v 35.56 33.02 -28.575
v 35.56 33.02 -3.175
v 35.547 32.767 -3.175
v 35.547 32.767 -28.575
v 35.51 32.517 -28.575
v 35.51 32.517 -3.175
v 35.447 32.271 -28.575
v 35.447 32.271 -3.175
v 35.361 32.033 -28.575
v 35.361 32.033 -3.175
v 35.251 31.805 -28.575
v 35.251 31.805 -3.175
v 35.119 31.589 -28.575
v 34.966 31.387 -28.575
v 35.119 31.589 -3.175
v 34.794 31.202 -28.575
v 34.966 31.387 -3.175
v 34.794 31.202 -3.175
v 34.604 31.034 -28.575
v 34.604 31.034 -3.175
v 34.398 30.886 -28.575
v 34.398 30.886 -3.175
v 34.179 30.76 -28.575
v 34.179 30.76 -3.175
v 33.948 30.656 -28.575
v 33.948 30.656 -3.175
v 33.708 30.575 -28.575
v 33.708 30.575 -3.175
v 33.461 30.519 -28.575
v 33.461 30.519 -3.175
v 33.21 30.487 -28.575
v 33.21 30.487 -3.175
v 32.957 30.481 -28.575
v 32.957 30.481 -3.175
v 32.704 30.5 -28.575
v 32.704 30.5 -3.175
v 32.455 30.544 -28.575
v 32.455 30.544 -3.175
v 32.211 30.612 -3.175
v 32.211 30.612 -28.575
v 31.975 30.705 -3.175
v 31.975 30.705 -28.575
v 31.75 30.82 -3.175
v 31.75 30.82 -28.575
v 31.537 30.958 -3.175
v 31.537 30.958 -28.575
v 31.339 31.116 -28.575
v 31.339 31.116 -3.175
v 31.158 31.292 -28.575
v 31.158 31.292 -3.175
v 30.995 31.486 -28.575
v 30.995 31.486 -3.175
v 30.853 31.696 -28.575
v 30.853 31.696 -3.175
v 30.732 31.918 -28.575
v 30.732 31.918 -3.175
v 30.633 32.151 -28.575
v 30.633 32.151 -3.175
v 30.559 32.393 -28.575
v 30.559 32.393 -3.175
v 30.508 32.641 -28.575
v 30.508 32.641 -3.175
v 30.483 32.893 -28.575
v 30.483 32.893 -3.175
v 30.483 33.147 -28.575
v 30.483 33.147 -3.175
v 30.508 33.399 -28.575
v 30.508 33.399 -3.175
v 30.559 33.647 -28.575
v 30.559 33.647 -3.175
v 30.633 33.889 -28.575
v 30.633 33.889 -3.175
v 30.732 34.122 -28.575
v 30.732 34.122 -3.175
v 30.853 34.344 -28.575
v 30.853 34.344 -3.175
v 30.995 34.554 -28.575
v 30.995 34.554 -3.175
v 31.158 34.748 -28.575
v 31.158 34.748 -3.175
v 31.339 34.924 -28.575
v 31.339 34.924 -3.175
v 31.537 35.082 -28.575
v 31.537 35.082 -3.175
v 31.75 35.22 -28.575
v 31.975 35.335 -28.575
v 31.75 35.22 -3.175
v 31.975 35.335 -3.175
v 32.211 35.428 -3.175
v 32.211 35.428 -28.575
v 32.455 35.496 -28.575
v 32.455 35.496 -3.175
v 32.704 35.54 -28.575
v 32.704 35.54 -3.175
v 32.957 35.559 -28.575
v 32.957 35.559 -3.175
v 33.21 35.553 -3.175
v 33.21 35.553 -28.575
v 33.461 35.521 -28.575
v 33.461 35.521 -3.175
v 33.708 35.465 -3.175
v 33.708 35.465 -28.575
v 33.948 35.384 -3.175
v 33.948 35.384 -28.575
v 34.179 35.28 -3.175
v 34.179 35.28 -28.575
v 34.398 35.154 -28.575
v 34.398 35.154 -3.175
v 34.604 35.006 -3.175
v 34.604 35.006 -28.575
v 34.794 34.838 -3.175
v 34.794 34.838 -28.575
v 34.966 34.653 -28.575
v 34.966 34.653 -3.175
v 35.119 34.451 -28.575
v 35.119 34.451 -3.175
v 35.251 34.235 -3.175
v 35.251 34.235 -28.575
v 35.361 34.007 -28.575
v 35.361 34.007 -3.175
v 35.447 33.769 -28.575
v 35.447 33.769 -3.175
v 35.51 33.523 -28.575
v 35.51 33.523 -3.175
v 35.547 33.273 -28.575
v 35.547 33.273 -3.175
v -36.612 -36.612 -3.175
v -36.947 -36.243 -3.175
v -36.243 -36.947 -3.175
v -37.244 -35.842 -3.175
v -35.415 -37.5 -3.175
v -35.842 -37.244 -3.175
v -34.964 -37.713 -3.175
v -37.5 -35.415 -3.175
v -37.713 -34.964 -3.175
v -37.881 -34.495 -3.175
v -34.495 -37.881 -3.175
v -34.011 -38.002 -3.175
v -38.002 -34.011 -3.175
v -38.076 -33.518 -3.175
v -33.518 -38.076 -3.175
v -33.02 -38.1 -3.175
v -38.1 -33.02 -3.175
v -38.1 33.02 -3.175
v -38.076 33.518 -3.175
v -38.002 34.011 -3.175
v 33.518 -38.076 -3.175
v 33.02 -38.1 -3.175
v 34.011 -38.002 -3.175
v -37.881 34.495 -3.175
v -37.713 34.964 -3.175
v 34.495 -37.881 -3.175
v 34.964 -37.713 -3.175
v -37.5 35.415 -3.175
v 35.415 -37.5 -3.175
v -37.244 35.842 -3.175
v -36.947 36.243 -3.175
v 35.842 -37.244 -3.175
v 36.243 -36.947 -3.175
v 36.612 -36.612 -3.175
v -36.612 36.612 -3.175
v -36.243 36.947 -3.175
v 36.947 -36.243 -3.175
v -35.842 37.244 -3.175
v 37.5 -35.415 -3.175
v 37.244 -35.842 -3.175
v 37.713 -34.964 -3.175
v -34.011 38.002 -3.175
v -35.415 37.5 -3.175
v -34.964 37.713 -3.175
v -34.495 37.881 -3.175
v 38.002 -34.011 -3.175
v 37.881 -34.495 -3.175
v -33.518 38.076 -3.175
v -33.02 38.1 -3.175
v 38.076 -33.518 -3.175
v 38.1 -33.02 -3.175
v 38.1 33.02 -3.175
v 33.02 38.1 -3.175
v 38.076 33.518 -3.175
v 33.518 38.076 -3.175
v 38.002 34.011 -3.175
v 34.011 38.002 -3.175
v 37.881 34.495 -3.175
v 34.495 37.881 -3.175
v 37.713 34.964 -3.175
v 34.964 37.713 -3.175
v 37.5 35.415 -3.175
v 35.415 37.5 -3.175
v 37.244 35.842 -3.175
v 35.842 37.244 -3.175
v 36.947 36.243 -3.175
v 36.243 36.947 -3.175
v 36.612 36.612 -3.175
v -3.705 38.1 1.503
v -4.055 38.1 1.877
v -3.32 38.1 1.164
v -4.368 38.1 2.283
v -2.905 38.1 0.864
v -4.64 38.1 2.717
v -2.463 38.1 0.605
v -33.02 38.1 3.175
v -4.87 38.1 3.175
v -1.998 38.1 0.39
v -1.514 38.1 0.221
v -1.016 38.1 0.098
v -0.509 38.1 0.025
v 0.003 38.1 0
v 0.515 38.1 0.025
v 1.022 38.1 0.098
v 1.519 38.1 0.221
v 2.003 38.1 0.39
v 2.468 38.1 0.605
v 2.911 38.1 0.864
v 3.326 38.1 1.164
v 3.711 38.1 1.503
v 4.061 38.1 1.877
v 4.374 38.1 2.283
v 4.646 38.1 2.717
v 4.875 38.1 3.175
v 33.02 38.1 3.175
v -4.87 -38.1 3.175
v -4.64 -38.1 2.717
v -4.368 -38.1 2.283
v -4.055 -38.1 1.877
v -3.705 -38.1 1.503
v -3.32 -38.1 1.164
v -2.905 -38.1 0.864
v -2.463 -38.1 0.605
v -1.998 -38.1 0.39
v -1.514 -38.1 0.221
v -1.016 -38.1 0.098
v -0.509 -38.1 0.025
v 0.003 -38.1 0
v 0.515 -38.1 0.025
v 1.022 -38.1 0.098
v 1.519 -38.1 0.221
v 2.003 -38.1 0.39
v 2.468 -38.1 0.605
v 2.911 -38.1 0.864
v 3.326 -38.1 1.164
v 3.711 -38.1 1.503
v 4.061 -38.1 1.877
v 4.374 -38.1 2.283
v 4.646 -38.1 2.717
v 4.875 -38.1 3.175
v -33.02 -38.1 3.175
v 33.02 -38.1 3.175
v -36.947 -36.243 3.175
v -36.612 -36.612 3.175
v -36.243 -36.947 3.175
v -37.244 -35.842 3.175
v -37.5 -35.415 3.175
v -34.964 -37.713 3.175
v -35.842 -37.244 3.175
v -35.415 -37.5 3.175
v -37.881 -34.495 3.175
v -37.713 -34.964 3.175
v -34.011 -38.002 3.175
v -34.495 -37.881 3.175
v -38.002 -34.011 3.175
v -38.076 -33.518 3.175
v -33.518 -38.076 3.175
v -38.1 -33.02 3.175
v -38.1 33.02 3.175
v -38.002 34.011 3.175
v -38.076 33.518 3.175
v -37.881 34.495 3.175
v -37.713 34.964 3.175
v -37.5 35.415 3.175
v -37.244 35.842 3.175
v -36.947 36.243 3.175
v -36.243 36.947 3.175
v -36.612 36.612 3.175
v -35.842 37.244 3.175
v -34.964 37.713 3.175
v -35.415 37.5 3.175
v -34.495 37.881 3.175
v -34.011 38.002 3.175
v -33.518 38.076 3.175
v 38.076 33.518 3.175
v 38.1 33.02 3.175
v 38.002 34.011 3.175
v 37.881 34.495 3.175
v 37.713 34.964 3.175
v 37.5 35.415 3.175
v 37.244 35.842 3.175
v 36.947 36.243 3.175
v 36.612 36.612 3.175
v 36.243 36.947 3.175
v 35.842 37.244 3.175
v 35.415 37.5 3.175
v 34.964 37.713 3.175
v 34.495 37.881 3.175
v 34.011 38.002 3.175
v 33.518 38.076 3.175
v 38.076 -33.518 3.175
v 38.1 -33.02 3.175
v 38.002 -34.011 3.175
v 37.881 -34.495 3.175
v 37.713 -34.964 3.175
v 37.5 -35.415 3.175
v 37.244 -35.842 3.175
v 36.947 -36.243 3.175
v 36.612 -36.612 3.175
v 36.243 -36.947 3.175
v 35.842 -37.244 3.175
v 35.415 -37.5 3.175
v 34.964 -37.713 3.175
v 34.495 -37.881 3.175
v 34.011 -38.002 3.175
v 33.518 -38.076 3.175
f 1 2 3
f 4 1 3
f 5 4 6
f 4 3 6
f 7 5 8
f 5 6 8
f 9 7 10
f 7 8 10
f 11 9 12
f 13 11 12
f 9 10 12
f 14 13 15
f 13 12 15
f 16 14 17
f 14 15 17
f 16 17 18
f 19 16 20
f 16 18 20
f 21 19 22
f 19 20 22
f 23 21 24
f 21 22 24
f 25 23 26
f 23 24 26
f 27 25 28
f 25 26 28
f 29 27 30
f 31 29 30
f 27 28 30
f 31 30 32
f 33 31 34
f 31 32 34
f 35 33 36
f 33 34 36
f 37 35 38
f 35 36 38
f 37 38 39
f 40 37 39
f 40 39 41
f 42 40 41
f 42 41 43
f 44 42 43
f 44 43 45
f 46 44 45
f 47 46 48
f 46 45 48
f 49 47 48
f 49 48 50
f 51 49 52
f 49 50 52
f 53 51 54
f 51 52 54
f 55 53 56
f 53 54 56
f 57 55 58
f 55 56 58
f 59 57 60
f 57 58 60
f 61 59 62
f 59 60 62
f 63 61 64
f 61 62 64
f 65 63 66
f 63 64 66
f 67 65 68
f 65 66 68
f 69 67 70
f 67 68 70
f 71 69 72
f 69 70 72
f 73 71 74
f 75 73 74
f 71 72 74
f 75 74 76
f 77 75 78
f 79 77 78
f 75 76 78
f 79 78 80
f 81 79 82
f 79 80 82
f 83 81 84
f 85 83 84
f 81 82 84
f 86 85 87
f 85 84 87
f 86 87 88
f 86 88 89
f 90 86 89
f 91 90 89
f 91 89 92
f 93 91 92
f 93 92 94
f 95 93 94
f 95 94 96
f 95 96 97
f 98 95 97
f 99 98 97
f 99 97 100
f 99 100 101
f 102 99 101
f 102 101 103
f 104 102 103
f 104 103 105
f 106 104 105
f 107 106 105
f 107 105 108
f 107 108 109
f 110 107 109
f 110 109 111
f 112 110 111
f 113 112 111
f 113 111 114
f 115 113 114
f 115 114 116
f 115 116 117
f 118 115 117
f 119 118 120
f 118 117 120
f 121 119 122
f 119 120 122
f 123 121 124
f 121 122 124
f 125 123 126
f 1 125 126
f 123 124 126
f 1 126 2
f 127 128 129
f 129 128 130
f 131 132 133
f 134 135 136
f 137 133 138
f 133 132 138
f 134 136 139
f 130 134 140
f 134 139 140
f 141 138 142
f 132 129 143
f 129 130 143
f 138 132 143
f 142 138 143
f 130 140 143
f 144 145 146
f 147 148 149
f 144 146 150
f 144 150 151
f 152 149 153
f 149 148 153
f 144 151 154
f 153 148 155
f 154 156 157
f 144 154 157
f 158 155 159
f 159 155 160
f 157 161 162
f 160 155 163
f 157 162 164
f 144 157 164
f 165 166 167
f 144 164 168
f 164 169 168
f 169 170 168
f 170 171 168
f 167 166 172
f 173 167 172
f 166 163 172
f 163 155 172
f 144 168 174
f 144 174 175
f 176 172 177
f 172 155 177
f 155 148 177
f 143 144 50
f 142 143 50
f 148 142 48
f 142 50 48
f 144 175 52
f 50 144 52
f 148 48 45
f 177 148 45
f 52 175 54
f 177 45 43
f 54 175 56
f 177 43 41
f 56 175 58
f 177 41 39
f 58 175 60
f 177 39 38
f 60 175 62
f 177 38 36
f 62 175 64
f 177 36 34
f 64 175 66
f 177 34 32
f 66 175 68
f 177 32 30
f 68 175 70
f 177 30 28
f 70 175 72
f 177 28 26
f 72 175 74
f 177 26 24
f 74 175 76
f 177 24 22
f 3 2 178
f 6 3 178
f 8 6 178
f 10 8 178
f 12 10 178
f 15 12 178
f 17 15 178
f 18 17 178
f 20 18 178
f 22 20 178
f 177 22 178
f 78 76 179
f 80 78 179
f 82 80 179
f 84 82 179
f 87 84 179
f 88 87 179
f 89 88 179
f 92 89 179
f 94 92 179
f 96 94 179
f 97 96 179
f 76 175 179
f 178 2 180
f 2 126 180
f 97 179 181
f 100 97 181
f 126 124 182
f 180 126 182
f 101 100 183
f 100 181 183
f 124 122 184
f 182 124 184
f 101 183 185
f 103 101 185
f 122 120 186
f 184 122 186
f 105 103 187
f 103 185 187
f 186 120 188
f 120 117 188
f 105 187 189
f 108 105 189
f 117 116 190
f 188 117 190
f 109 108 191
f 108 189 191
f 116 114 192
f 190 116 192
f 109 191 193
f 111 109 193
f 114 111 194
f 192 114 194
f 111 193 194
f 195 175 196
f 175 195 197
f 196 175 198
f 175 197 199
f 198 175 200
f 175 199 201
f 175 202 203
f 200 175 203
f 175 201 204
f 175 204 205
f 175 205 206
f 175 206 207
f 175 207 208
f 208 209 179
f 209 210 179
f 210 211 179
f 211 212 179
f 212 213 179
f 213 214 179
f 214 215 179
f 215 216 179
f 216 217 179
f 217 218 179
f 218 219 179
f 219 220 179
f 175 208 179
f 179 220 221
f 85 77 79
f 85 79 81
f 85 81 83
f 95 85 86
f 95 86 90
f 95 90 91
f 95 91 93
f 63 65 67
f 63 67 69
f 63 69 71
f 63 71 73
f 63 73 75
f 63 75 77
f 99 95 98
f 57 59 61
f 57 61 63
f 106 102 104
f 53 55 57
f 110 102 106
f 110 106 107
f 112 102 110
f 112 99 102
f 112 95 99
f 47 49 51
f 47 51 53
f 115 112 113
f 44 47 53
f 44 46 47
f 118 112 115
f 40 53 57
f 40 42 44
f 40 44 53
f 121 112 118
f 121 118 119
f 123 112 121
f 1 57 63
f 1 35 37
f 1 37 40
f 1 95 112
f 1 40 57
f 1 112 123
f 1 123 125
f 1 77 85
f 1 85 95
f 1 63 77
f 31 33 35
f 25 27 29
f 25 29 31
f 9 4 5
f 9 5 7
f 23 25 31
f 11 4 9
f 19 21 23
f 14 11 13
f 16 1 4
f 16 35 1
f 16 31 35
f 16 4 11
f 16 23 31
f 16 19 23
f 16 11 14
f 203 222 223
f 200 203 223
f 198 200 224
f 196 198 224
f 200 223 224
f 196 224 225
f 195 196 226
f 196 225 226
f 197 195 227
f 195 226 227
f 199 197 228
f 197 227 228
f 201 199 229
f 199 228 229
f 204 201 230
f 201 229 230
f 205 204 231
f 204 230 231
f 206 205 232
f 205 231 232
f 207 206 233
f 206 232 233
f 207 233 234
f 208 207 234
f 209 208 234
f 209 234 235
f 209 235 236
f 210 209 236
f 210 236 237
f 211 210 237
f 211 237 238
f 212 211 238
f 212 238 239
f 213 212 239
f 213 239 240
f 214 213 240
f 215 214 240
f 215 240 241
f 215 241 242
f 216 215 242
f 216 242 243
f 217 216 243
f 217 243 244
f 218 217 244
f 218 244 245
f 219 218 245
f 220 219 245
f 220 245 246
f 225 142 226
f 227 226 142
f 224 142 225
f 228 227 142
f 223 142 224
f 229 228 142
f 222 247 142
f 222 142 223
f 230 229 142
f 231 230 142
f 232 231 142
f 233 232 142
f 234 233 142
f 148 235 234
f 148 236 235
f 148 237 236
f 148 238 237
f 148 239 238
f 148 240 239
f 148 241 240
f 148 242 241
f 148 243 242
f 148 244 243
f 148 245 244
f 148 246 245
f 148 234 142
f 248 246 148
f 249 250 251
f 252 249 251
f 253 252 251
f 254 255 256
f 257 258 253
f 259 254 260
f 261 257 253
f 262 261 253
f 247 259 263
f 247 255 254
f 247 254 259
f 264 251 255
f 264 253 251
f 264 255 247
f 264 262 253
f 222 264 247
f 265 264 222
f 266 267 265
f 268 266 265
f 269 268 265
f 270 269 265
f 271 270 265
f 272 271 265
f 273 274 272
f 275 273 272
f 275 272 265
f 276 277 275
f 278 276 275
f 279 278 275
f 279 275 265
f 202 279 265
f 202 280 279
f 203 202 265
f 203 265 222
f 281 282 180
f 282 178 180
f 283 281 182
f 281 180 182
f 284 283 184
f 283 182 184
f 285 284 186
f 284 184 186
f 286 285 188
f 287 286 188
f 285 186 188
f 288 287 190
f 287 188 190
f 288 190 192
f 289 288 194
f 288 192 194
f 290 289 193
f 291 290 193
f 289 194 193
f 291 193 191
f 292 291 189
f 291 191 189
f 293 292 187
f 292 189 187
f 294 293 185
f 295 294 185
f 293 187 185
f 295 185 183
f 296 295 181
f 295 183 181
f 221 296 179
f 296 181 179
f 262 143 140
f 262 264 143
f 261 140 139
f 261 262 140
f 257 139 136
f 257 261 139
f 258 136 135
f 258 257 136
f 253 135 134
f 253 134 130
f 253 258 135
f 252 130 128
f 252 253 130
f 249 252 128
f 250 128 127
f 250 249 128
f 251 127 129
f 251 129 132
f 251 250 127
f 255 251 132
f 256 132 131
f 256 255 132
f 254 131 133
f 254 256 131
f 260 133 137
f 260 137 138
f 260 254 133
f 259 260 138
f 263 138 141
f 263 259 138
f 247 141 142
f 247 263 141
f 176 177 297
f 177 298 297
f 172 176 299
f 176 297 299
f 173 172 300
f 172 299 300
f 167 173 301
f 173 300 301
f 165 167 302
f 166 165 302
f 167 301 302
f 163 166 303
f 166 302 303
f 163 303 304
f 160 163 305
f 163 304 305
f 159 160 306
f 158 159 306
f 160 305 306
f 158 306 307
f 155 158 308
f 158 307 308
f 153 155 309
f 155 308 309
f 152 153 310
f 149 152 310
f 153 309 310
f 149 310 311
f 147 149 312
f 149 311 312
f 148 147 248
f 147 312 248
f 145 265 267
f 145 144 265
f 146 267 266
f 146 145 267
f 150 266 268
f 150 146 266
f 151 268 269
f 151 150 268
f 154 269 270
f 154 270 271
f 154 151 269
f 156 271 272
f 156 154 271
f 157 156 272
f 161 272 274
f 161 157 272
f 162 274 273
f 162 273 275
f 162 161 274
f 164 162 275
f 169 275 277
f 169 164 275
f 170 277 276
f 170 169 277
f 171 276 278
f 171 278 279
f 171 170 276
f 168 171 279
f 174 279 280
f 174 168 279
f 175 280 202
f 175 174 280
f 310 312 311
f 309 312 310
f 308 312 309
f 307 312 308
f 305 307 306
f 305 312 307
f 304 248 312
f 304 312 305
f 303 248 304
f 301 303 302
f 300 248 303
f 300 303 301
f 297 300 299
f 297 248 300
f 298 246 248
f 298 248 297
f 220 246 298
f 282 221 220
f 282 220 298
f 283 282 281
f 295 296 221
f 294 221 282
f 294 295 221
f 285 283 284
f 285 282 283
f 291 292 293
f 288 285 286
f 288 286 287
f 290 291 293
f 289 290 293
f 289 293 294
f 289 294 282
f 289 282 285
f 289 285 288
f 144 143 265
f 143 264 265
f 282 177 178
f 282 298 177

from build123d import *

# Parameters (mm, degrees)
F0_W     = 76.2
F0_H     = 76.2
F1_DEPTH = 3.175
F2_R     = 5.08
F4_DEPTH = 76.201
F5_R     = 2.54
F6_DEPTH = 25.4


with BuildPart() as f1:
    # F0 (on Top) → F1 (new body, symmetric)
    with BuildSketch(Plane.XY):
        Rectangle(F0_W, F0_H)
    extrude(amount=F1_DEPTH, both=True)

    # F2
    f2_edges = [f1.edges().sort_by_distance(p)[0] for p in [
        (38.1, -38.1, 0),
        (38.1, 38.1, 0),
        (-38.1, 38.1, 0),
        (-38.1, -38.1, 0),
    ]]
    fillet(f2_edges, radius=F2_R)

    # F3 (on face) → F4 (cut, through all)
    with BuildSketch(Plane.XZ.offset(38.1)):
        with BuildLine():
            Line((4.875244, 3.175), (-4.869716, 3.175))
            ThreePointArc((-4.869716, 3.175), (0.002764, -1e-06), (4.875244, 3.175))
        make_face()
    extrude(amount=-F4_DEPTH, mode=Mode.SUBTRACT)

    # F5 (on face) → F6 (join)
    with BuildSketch(Plane(origin=(0, 0, -3.175), x_dir=(1, 0, 0), z_dir=(0, 0, -1))):
        with Locations((33.02, -33.02)):
            Circle(F5_R)
    extrude(amount=F6_DEPTH)


solid = f1.part
